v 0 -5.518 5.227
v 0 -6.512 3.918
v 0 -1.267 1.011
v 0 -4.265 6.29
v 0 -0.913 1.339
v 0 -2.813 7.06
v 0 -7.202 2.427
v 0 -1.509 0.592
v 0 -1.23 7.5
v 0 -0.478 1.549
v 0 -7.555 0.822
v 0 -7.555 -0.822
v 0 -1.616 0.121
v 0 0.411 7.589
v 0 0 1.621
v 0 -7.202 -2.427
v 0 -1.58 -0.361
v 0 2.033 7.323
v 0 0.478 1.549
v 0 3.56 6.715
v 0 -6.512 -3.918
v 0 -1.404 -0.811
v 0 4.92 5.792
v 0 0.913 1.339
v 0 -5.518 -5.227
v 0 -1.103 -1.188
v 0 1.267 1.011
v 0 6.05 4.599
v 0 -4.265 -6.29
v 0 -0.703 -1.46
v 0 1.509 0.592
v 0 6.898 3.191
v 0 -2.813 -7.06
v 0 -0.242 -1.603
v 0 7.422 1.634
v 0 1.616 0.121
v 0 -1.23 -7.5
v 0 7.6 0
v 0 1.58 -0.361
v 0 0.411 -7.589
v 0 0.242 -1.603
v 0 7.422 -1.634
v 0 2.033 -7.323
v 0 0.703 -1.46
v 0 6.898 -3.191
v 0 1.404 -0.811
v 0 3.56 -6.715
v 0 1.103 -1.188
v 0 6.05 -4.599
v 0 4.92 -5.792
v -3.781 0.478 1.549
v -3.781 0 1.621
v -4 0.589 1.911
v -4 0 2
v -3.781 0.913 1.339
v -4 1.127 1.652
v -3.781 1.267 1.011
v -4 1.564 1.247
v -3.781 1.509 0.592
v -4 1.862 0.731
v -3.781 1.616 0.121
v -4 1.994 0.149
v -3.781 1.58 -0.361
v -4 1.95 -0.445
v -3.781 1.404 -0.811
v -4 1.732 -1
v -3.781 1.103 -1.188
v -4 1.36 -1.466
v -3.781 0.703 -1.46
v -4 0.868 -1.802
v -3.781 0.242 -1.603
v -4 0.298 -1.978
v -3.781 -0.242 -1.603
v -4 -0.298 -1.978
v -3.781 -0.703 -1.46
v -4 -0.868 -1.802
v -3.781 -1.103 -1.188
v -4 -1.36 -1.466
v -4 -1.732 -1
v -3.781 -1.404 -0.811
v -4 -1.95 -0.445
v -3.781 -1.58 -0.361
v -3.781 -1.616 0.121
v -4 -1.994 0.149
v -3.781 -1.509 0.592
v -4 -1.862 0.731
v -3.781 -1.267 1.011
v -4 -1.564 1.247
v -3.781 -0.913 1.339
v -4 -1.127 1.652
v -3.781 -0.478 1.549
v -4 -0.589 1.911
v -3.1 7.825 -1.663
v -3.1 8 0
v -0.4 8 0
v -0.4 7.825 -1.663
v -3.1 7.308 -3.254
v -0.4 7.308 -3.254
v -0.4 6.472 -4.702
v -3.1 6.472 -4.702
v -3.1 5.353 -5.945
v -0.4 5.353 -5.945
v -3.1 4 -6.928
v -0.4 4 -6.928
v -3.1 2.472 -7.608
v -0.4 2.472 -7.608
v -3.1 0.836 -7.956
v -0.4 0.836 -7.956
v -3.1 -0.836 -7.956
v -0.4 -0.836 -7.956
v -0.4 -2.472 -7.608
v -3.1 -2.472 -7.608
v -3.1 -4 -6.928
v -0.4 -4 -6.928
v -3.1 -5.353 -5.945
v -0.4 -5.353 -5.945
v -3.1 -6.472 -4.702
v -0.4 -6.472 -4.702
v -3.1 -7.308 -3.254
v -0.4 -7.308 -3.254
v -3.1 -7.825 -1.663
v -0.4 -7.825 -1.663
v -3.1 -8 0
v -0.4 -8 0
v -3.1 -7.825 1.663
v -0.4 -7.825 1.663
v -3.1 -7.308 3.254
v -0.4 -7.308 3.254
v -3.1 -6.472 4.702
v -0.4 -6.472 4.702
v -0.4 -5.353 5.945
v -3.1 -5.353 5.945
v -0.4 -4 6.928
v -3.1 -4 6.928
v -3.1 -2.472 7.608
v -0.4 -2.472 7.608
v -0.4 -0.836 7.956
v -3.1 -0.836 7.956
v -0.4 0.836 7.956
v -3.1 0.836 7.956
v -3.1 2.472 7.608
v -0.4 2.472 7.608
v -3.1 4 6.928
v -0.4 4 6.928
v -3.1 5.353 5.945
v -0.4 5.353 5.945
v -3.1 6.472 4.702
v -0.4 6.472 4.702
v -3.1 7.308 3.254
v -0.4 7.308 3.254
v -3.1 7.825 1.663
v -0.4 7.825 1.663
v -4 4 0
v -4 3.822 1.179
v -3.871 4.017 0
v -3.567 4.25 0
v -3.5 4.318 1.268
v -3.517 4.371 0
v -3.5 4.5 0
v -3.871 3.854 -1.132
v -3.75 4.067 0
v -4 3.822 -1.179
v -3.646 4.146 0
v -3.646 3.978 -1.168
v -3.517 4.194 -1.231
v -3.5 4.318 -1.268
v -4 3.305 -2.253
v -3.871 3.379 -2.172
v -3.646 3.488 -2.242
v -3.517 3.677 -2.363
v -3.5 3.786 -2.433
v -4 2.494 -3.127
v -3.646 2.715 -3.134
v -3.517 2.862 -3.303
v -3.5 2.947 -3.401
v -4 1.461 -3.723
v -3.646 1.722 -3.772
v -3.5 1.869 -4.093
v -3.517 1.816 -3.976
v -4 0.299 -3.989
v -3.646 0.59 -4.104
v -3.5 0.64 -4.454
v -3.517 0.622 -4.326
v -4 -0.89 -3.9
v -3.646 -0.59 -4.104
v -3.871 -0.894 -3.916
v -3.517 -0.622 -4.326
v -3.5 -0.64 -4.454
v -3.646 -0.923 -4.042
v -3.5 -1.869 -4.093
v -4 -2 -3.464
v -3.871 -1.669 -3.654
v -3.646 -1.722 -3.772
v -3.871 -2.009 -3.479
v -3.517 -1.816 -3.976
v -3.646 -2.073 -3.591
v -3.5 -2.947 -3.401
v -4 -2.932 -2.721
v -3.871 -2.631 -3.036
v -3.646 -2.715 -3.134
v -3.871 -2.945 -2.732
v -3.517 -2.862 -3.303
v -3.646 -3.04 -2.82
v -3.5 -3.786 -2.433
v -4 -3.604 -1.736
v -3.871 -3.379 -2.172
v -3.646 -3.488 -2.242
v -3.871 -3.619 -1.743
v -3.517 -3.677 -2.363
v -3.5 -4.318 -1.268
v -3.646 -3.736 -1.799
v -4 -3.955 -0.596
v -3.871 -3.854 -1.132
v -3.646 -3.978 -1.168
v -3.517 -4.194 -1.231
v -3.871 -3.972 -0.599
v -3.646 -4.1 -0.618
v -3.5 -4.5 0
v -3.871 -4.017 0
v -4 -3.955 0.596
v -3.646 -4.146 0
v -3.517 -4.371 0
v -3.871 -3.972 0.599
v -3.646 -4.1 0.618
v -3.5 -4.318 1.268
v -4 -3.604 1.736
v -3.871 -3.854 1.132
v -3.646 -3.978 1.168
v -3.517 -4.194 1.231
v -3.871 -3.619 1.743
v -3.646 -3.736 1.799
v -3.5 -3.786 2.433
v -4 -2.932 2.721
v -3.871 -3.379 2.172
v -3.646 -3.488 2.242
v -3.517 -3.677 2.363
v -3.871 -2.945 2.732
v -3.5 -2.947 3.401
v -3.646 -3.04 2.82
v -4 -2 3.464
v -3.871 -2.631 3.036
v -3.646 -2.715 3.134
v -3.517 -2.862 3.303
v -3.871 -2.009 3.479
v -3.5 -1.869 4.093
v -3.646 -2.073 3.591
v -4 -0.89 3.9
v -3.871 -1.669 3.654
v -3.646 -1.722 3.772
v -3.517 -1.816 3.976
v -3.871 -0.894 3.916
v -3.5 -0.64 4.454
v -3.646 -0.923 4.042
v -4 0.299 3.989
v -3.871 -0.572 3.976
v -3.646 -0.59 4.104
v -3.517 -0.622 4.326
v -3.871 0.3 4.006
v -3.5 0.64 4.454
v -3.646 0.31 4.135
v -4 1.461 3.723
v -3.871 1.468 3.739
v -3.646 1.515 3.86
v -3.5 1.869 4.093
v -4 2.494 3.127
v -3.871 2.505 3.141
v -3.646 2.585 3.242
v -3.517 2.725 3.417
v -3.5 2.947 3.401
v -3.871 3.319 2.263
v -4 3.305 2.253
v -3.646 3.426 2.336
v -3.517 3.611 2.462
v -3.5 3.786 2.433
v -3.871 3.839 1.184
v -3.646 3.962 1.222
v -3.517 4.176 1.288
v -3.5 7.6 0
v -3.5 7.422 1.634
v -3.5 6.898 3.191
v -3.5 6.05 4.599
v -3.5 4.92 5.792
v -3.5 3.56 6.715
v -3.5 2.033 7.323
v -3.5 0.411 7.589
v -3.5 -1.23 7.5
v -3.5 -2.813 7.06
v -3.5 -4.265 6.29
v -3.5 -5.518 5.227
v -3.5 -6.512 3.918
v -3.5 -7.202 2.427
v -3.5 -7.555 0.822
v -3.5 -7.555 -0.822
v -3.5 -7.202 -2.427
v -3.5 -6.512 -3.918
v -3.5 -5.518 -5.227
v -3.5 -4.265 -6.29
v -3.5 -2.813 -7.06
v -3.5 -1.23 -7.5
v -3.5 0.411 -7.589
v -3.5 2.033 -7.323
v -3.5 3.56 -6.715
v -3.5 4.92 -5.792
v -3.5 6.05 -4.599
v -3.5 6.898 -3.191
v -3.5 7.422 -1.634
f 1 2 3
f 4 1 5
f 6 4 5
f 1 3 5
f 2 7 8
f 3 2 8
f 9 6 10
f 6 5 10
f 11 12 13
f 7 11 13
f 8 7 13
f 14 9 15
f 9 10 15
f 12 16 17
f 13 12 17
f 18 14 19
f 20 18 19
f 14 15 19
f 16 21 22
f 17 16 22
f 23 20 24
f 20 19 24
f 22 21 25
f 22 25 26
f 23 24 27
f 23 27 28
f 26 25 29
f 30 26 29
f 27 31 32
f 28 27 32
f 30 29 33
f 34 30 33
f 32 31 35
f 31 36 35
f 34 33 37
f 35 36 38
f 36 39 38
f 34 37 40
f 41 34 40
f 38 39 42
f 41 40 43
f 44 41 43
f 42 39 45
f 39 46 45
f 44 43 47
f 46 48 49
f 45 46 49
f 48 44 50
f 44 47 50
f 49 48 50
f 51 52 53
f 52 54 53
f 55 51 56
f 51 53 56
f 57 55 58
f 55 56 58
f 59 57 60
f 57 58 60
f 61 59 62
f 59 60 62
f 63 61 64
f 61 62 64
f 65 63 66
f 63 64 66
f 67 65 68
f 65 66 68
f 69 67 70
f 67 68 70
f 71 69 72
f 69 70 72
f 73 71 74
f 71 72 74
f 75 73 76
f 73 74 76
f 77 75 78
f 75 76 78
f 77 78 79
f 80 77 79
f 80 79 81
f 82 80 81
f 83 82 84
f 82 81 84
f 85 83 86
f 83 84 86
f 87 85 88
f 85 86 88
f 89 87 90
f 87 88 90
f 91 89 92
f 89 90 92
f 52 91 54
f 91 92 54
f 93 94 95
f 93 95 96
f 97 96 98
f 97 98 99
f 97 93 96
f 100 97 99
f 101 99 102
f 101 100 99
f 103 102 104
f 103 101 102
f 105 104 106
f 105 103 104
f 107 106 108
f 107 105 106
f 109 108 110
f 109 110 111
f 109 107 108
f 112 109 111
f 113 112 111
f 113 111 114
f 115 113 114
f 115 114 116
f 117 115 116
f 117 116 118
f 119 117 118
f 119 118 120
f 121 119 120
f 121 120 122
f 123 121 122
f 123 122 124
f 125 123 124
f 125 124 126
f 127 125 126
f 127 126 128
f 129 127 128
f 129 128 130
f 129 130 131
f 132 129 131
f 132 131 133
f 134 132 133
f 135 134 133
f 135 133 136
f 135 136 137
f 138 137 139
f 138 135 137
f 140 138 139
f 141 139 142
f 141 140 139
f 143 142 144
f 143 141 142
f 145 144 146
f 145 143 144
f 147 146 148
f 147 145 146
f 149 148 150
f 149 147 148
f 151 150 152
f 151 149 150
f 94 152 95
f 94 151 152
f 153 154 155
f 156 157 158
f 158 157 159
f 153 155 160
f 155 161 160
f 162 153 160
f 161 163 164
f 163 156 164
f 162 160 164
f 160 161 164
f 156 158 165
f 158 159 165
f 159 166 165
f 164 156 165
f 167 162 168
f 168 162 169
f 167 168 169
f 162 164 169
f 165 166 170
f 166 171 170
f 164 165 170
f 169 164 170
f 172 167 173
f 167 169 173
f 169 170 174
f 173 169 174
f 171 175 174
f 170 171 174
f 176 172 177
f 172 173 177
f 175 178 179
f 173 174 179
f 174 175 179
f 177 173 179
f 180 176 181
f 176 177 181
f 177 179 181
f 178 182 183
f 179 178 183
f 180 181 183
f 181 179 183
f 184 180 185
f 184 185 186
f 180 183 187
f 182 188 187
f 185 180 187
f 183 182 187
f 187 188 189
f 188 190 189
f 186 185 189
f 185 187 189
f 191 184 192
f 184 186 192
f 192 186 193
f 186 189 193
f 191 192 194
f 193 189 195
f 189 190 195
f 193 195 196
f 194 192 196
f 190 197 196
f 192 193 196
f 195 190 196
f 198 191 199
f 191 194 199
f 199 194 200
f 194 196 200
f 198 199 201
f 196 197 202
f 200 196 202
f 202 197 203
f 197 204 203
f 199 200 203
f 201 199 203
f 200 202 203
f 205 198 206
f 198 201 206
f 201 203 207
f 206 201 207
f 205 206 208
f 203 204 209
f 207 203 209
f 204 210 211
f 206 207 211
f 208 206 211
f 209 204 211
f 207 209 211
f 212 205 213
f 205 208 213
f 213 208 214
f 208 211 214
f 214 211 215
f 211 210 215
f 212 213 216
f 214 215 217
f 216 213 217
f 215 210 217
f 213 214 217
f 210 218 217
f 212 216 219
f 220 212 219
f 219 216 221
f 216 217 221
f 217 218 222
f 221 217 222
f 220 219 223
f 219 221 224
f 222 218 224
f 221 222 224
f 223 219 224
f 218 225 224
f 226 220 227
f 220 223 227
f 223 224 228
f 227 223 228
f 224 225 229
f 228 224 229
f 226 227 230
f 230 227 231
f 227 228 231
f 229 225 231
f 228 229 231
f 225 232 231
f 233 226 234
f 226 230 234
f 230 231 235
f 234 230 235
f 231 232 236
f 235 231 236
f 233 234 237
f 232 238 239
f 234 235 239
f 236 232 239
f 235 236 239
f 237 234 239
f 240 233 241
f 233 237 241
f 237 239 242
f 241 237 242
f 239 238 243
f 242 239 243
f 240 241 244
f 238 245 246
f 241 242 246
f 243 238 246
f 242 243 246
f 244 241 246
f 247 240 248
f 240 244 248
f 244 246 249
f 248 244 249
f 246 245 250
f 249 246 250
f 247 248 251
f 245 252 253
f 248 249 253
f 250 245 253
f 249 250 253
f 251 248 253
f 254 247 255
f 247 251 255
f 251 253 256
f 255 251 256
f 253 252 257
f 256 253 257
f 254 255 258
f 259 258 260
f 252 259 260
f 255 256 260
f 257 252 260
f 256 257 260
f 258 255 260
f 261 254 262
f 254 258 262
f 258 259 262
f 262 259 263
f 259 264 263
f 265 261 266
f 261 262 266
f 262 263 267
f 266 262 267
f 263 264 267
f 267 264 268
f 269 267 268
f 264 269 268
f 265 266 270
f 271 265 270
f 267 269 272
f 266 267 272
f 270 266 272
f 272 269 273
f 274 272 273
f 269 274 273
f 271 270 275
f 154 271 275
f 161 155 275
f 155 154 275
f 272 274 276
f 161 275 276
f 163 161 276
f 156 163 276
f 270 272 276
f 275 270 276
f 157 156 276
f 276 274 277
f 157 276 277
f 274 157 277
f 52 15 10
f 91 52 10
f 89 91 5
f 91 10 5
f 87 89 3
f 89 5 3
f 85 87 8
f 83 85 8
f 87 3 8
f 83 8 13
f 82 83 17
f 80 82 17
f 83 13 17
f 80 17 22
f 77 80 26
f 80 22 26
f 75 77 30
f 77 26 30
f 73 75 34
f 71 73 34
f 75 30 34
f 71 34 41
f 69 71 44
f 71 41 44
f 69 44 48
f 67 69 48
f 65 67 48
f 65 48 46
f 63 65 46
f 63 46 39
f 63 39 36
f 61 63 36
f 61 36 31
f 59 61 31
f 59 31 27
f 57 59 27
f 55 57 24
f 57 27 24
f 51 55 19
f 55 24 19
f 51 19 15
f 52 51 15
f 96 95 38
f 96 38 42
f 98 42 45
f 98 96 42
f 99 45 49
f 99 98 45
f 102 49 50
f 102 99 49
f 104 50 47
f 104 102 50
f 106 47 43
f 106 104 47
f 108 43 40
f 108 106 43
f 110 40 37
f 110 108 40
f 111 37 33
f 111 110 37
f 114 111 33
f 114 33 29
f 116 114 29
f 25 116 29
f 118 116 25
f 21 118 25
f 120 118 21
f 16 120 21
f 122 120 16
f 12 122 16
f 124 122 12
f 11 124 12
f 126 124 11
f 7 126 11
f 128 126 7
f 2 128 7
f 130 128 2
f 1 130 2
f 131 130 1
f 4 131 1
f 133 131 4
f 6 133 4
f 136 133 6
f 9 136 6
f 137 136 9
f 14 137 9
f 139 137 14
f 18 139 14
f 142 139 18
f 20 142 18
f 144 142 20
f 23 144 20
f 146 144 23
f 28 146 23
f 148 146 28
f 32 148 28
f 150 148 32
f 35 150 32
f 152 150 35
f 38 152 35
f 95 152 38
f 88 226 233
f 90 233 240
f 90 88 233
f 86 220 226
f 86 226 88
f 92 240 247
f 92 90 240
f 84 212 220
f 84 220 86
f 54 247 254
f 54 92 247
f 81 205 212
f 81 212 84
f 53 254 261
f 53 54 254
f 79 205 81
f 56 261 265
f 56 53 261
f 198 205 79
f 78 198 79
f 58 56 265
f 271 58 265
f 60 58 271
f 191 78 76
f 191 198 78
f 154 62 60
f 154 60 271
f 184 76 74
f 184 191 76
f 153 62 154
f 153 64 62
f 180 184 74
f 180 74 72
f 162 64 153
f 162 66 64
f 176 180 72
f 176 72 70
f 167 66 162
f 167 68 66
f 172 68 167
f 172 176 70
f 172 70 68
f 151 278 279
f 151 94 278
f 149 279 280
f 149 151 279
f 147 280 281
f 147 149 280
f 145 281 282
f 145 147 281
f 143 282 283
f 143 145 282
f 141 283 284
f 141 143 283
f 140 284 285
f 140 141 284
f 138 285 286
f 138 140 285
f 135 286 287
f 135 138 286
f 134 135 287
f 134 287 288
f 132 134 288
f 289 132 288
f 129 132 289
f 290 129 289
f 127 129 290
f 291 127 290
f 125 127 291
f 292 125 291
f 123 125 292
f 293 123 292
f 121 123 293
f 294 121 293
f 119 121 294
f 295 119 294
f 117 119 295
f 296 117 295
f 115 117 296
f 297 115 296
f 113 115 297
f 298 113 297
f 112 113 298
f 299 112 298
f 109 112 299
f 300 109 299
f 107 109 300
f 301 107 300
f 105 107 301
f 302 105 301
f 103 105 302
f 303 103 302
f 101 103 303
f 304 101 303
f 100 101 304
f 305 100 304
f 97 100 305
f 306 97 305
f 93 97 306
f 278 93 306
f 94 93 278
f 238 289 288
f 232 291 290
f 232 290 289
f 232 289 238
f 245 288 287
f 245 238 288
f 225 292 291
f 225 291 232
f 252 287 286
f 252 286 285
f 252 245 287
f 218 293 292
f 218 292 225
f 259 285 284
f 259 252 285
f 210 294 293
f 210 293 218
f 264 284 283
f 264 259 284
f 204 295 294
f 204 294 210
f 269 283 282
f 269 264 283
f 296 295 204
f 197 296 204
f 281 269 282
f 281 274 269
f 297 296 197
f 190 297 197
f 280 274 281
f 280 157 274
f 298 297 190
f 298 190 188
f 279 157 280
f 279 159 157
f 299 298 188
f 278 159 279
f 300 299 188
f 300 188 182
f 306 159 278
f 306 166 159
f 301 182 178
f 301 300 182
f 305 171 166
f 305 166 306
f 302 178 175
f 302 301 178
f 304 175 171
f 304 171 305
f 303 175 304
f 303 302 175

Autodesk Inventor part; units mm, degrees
ref_plane "YZ Plane" through (0, 0, 0) normal (1, 0, 0) x (0, 1, 0)
ref_plane "XZ Plane" through (0, 0, 0) normal (0, 1, 0) x (-1, 0, 0)
sketch "Skizze1" plane through (0, 0, 0) normal (0, 0, 1) x (1, 0, 0)
  line L0 (0, 0) -> (-4, 0)
  line L1 (0, 0) -> (0, 8)
  line L2 (0, 8) -> (-3.5, 8)
  line L3 (-3.5, 8) -> (-3.5, 4.5)
  line L4 (-4, 4) -> (-4, 4)
  line L5 (-4, 4) -> (-4, 0)
  arc A0 (-4, 4) -> (-3.5, 4.5) centre (-4, 4.5) ccw
  dimension "d0" = 0.5
  dimension "d1" = 4
  dimension "d2" = 16
  dimension "d3" = 8
revolve "Körper" add sketch "Skizze1" angle 360 about axis through (0, 0, 0) along (-1, 0, 0)
sketch "Skizze2" plane through (-4, 0, 0) normal (-1, 0, 0) x (0, 0, 1)
  circle A0 centre (0, 0) radius 8 projected
  line L0 (0, 0) -> (0, 8) construction
  line L1 (-0.25, 7.9961) -> (0, 7.7461)
  line L2 (0.25, 7.9961) -> (0, 7.7461)
  arc A1 (0.25, 7.9961) -> (-0.25, 7.9961) centre (0, 0) ccw
  circle A2 centre (0, 0) radius 4 projected
  dimension "d4" = 90
  dimension "d5" = 0.25
chamfer "Fase1" distance 0.4 angle 45 1 edges at (0, -8, 0) measured on face at (0, 3.2134, 0.792)
chamfer "Fase2" distance 0.4 angle 45 1 edges at (-3.5, -8, 0) measured on face at (-3.5, 6.7558, 0.6382)
extrude "Nut1" [suppressed]
pattern_circular "Nuten1" [suppressed]
hole "Gewinde" at (-4, 0, 0) direction (1, 0, 0) diameter 3.242 end through all thread size "M4x0.7" class "6H" standard "ISO Metric profile"
chamfer "Fase3" distance 0.3789 angle 30 1 edges at (-4, 0, -1.621) measured on face at (-4, 3.1643, 0.3842)
ref_plane "Work Plane1" through (6.0312, 0, 0) normal (0, 0, -1) x (-1, 0, 0)
equation "\"d5\" = 0.5 * T"
equation "\"d13\" = PHH"
equation "\"d15\" = FAWI"
equation "\"d36\" = PHH"
equation "\"d23\" = PHH"
equation "\"d24\" = FAWI"
equation "\"d37\" = PHH"
equation "\"d10\" = -0.5 * GD1 + 0.5 * NND"
equation "\"d38\" = -0.5 * GD1 + 0.5 * NND"
equation "\"d0\" = RR"
equation "\"d1\" = KOH"
equation "\"d2\" = KOD"
equation "\"d3\" = BDM"
equation "\"FAWI\" = 45deg"
equation "\"T\" = 0.5"
equation "\"NND\" = 4"
equation "\"KOD\" = 16"
equation "\"KOH\" = 4"
equation "\"KOH1\" = 3.5"
equation "\"BDM\" = 8"
equation "\"PHH\" = 0.4"
equation "\"RR\" = 0.5"
equation "\"GUL\" = 0.541266 * PTC"
equation "\"THREADDIA\" = 4"
equation "\"TOA\" = 30deg"
equation "\"PTC\" = 0.7"
equation "\"GAL\" = 0.541266 * PTC"
equation "\"GD1\" = 3.242228"
properties part number "DIN 467 - M4" material "Stahl, weich"
